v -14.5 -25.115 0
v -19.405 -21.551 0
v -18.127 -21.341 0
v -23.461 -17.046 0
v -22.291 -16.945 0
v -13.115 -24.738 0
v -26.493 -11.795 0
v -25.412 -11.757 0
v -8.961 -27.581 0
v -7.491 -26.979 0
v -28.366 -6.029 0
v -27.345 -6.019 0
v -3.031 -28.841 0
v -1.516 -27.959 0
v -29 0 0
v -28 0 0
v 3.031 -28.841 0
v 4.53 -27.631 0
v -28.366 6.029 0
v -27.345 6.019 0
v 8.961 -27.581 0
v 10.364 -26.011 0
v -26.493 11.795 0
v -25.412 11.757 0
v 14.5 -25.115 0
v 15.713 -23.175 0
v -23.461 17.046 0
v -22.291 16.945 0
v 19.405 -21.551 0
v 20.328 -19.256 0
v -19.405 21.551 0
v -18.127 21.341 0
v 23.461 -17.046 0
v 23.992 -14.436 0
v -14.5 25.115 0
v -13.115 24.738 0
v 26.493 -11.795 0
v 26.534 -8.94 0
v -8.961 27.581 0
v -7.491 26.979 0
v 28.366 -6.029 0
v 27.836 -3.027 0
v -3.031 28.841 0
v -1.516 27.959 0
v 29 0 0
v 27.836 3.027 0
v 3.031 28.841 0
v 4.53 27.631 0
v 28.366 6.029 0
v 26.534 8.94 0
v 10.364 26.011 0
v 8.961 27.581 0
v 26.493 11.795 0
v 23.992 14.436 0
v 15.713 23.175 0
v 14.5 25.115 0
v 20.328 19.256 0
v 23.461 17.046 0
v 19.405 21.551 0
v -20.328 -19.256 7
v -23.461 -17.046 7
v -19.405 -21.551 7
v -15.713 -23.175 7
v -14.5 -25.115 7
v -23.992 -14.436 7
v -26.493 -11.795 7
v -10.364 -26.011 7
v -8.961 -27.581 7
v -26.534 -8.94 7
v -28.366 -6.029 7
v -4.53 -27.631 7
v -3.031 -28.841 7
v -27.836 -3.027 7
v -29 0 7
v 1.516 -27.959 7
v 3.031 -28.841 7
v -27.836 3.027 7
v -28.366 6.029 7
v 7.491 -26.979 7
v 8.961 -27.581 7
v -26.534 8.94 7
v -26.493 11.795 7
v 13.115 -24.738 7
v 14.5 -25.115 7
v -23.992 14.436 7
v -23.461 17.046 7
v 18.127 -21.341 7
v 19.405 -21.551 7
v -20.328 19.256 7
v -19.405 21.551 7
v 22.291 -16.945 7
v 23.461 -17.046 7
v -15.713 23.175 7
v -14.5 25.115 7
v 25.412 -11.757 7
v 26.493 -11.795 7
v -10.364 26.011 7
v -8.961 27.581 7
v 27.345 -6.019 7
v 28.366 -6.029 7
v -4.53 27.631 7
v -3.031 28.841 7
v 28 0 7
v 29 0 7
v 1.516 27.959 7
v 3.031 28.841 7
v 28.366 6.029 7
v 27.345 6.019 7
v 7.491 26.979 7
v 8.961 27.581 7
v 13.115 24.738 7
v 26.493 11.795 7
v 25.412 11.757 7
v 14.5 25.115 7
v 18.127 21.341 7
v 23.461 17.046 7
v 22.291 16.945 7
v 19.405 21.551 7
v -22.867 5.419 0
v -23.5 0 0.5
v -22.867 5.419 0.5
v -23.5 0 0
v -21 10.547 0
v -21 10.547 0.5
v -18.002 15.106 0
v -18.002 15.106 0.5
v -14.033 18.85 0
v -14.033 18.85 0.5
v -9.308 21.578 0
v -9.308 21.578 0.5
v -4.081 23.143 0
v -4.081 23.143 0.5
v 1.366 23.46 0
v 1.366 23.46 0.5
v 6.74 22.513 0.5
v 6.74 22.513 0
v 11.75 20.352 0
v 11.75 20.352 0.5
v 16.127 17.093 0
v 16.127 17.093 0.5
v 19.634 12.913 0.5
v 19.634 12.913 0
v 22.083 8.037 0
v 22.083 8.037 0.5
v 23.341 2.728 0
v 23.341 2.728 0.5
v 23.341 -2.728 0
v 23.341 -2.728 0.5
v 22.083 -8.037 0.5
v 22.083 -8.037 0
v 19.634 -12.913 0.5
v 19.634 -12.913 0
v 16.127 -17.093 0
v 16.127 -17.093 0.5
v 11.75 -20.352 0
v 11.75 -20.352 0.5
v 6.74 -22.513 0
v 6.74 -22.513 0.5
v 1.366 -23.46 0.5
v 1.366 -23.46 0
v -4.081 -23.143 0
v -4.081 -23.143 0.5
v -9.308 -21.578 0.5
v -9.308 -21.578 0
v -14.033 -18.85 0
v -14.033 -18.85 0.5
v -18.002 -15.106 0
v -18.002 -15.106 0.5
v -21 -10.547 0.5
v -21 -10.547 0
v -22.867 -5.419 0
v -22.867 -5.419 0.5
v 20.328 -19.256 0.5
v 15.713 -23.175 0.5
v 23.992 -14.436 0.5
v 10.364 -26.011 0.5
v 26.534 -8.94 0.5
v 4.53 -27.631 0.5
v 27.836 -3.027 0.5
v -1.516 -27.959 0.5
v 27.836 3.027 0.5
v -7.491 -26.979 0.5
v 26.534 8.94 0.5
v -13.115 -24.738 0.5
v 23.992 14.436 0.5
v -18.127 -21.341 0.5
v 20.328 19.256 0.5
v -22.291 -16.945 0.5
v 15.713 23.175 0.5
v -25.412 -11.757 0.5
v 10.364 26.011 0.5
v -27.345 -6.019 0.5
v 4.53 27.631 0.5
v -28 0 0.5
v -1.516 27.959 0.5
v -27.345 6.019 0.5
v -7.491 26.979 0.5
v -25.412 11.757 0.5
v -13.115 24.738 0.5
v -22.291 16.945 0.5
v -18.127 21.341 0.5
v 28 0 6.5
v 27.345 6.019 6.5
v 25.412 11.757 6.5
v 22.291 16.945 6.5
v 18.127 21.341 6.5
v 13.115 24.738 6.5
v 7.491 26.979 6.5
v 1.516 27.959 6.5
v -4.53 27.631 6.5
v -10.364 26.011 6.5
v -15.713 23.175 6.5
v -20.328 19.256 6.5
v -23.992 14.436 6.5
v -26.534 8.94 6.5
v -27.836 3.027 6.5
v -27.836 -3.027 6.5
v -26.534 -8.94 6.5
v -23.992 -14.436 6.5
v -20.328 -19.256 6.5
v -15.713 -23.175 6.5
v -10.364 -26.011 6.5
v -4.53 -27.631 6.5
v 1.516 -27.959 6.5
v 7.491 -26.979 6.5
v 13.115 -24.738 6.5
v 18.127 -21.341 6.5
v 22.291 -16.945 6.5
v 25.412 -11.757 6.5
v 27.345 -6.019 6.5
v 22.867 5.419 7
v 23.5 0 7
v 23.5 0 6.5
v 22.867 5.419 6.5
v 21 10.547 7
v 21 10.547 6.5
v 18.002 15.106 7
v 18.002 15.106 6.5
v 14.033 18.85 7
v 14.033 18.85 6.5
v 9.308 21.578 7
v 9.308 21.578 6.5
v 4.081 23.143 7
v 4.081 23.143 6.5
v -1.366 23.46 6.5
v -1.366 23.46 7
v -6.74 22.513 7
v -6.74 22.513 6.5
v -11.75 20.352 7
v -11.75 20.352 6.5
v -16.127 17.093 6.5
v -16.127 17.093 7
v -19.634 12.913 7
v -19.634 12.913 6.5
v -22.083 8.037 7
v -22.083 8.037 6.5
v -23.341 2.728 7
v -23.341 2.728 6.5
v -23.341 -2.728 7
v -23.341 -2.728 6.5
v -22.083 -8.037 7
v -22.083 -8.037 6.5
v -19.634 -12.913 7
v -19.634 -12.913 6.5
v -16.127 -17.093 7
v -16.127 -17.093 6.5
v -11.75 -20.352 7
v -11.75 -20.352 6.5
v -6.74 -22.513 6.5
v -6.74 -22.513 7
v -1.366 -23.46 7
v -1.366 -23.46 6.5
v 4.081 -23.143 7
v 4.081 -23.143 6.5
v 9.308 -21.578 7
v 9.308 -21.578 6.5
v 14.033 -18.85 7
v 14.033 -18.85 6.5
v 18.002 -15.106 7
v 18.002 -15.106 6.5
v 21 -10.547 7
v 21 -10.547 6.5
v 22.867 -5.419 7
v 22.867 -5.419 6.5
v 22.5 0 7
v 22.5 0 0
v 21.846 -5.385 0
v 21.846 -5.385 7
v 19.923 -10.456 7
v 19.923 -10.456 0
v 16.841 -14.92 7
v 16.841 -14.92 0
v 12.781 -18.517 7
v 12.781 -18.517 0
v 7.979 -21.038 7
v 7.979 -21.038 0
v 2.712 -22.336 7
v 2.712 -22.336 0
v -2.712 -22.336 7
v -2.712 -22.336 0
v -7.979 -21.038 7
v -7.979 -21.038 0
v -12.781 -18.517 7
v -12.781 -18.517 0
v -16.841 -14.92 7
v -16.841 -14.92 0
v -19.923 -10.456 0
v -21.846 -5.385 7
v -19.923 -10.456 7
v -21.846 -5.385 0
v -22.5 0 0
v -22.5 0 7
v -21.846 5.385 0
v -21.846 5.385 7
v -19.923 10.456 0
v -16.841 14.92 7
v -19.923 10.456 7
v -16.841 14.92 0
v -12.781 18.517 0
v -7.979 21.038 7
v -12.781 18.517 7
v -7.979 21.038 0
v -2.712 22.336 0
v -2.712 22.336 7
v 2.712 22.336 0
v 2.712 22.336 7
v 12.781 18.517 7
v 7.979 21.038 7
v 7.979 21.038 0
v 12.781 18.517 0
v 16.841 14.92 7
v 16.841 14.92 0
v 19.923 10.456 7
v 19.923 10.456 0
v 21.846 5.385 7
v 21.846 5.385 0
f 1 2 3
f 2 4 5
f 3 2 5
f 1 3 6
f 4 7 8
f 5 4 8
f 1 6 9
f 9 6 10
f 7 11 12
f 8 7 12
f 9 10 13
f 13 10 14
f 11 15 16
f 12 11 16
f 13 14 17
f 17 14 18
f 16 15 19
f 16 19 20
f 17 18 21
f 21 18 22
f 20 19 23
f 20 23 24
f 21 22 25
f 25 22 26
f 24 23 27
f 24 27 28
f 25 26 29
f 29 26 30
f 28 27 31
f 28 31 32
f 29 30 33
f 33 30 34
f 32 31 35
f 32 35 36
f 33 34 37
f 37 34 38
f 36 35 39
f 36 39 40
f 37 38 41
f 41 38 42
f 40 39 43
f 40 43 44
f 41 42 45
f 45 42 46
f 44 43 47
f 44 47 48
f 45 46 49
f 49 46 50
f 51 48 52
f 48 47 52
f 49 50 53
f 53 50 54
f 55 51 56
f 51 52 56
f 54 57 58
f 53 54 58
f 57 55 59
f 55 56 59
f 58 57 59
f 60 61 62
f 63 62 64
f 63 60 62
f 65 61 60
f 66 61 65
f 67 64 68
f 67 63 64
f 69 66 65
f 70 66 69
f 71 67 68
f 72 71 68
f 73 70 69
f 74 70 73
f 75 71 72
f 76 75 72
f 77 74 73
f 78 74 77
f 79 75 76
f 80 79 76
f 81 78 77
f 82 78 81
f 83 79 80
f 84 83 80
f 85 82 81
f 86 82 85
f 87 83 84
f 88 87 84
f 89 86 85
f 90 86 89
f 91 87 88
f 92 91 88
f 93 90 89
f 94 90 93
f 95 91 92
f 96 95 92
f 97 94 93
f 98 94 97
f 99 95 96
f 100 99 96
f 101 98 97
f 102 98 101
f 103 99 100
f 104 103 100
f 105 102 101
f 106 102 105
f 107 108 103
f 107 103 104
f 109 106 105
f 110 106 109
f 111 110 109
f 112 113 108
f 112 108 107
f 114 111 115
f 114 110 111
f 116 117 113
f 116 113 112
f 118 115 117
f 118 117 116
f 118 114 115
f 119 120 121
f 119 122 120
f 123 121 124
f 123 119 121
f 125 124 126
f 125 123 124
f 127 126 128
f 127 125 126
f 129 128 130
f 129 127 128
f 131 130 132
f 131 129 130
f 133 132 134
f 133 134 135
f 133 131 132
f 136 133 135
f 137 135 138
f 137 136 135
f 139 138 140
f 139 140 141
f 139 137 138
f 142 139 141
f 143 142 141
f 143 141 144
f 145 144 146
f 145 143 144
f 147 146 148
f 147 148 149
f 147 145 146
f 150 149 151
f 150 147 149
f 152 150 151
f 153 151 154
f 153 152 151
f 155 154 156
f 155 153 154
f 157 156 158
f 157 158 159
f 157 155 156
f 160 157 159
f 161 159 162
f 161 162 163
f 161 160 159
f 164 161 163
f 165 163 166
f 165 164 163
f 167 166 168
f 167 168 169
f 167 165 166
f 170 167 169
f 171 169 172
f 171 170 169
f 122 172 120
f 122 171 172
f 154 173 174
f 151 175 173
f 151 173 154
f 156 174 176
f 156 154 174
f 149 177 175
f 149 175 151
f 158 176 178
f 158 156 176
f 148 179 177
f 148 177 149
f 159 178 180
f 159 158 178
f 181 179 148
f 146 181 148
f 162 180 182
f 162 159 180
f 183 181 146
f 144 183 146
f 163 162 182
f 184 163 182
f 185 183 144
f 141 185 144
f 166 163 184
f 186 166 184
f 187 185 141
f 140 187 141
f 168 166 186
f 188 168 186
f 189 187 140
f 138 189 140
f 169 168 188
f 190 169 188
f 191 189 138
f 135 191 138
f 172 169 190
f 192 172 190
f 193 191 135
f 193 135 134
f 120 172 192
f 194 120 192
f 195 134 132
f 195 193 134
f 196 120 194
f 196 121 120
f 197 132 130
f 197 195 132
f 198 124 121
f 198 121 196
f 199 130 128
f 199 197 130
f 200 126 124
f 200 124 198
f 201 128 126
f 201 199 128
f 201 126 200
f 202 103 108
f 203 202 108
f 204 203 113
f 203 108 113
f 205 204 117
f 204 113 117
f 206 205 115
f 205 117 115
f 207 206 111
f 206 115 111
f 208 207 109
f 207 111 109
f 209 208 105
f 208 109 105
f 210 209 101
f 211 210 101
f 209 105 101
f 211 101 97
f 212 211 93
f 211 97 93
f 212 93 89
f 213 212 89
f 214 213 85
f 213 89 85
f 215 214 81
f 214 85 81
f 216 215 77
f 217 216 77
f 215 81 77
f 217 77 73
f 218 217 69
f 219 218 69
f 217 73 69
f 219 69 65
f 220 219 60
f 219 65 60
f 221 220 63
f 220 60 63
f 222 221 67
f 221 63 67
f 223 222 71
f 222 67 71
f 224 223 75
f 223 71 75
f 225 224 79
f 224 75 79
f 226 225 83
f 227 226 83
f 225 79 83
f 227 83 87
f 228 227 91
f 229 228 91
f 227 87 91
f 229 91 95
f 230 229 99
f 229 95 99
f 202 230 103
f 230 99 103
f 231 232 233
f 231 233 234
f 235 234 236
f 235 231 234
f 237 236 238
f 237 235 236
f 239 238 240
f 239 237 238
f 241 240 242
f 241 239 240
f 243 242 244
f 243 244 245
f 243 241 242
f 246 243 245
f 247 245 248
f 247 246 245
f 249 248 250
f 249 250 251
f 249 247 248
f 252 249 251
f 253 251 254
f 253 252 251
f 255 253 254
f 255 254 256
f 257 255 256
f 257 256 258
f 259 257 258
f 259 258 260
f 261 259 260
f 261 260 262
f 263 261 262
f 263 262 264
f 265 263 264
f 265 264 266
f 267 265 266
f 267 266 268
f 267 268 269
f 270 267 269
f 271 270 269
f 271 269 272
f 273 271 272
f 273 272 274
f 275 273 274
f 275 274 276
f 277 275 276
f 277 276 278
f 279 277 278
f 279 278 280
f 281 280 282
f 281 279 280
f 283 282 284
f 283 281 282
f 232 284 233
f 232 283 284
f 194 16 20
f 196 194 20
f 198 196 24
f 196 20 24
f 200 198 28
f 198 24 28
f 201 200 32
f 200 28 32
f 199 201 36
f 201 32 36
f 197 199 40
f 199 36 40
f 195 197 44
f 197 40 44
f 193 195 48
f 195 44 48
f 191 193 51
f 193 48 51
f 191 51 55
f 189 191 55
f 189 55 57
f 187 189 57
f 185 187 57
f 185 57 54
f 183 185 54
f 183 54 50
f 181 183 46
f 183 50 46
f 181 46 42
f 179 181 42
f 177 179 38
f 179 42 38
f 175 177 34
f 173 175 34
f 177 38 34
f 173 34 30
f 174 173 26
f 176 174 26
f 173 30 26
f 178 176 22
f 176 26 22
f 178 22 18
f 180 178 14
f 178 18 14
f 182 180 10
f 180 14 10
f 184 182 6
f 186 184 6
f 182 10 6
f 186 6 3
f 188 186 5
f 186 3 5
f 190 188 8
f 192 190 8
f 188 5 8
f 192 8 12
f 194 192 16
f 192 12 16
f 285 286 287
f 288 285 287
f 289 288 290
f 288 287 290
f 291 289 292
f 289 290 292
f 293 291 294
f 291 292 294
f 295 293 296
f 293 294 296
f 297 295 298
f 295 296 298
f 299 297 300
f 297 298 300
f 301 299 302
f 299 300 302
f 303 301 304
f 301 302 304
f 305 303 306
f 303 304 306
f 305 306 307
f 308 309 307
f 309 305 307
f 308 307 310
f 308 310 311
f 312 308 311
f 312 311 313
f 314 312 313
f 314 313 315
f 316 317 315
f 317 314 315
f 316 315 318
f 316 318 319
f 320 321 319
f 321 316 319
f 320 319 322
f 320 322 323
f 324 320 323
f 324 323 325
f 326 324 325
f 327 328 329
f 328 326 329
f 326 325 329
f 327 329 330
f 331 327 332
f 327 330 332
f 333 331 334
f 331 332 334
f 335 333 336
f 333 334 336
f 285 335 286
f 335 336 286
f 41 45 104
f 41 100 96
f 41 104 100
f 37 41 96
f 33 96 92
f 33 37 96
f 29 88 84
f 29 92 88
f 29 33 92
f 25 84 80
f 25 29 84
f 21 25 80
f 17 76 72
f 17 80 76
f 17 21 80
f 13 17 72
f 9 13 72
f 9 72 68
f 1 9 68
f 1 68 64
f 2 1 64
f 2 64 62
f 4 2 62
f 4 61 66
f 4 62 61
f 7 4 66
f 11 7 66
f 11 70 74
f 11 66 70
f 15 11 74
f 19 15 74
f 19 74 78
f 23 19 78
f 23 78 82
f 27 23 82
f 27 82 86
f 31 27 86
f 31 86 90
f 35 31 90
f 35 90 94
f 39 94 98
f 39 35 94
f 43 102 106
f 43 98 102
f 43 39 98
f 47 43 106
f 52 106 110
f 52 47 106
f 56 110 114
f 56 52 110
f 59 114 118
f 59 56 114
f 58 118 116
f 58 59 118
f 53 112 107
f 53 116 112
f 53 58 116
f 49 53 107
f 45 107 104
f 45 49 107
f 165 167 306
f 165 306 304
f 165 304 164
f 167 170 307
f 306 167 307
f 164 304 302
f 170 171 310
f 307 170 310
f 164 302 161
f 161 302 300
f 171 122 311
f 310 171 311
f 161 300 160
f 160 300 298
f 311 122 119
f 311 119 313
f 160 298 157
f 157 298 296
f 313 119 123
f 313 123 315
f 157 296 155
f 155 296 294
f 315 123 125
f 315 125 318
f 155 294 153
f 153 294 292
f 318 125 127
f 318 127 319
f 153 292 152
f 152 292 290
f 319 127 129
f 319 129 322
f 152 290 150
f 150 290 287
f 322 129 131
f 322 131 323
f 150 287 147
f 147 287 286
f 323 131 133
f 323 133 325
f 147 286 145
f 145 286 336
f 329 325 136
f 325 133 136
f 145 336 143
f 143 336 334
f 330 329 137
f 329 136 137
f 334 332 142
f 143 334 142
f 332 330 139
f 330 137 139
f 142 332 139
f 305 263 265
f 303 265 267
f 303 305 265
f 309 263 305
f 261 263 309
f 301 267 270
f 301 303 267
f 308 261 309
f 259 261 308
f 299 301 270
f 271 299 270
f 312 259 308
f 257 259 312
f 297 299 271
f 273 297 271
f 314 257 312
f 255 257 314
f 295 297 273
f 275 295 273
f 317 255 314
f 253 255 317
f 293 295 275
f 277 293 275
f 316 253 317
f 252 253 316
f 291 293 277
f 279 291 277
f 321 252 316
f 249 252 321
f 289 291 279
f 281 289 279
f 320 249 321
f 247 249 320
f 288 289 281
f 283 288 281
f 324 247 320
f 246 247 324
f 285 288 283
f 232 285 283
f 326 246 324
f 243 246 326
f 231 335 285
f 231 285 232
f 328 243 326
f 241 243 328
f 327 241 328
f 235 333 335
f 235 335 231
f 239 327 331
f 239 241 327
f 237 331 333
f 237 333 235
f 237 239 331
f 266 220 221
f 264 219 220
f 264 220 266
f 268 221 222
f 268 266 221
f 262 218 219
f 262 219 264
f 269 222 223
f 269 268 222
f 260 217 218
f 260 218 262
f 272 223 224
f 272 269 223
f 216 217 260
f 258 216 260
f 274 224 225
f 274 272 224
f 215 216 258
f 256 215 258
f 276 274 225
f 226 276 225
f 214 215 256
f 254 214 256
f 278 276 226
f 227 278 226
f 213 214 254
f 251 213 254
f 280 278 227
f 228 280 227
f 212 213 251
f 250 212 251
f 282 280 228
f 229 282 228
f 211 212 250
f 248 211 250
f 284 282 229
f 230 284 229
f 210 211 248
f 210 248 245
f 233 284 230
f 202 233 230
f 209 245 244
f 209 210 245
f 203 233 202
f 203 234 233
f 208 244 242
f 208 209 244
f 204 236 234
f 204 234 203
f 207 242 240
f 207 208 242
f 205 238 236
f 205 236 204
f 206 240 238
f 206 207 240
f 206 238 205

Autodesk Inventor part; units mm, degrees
ref_plane "YZ Plane" through (0, 0, 0) normal (1, 0, 0) x (0, 1, 0)
ref_plane "XZ Plane" through (0, 0, 0) normal (0, 1, 0) x (-1, 0, 0)
ref_plane "XY Plane" through (0, 0, 0) normal (0, 0, 1) x (1, 0, 0)
sketch "Sketch1" plane through (0, 0, 0) normal (0, 0, 1) x (1, 0, 0)
  circle A0 centre (0, 0) radius 29
  circle A1 centre (0, 0) radius 22.5
  dimension "d0" = 58
  dimension "d1" = 45
extrude "Extrusion1" add sketch "Sketch1" along normal blind 7
sketch "Sketch2" plane through (0, 0, 7) normal (0, 0, 1) x (1, 0, 0)
  circle A0 centre (0, 0) radius 29 projected
  circle A1 centre (0, 0) radius 22.5 projected
  circle A2 centre (0, 0) radius 28
  circle A3 centre (0, 0) radius 23.5
  dimension "d4" = 1
  dimension "d5" = 1
extrude "Extrusion2" cut sketch "Sketch2" against normal blind 0.5 contours A2
sketch "Sketch3" plane through (0, 0, 0) normal (0, 0, -1) x (-1, 0, 0)
  circle A0 centre (0, 0) radius 28 projected
  circle A1 centre (0, 0) radius 23.5 projected
extrude "Extrusion3" cut sketch "Sketch3" against normal blind 0.5
properties part number "bearing_58x45x7"
